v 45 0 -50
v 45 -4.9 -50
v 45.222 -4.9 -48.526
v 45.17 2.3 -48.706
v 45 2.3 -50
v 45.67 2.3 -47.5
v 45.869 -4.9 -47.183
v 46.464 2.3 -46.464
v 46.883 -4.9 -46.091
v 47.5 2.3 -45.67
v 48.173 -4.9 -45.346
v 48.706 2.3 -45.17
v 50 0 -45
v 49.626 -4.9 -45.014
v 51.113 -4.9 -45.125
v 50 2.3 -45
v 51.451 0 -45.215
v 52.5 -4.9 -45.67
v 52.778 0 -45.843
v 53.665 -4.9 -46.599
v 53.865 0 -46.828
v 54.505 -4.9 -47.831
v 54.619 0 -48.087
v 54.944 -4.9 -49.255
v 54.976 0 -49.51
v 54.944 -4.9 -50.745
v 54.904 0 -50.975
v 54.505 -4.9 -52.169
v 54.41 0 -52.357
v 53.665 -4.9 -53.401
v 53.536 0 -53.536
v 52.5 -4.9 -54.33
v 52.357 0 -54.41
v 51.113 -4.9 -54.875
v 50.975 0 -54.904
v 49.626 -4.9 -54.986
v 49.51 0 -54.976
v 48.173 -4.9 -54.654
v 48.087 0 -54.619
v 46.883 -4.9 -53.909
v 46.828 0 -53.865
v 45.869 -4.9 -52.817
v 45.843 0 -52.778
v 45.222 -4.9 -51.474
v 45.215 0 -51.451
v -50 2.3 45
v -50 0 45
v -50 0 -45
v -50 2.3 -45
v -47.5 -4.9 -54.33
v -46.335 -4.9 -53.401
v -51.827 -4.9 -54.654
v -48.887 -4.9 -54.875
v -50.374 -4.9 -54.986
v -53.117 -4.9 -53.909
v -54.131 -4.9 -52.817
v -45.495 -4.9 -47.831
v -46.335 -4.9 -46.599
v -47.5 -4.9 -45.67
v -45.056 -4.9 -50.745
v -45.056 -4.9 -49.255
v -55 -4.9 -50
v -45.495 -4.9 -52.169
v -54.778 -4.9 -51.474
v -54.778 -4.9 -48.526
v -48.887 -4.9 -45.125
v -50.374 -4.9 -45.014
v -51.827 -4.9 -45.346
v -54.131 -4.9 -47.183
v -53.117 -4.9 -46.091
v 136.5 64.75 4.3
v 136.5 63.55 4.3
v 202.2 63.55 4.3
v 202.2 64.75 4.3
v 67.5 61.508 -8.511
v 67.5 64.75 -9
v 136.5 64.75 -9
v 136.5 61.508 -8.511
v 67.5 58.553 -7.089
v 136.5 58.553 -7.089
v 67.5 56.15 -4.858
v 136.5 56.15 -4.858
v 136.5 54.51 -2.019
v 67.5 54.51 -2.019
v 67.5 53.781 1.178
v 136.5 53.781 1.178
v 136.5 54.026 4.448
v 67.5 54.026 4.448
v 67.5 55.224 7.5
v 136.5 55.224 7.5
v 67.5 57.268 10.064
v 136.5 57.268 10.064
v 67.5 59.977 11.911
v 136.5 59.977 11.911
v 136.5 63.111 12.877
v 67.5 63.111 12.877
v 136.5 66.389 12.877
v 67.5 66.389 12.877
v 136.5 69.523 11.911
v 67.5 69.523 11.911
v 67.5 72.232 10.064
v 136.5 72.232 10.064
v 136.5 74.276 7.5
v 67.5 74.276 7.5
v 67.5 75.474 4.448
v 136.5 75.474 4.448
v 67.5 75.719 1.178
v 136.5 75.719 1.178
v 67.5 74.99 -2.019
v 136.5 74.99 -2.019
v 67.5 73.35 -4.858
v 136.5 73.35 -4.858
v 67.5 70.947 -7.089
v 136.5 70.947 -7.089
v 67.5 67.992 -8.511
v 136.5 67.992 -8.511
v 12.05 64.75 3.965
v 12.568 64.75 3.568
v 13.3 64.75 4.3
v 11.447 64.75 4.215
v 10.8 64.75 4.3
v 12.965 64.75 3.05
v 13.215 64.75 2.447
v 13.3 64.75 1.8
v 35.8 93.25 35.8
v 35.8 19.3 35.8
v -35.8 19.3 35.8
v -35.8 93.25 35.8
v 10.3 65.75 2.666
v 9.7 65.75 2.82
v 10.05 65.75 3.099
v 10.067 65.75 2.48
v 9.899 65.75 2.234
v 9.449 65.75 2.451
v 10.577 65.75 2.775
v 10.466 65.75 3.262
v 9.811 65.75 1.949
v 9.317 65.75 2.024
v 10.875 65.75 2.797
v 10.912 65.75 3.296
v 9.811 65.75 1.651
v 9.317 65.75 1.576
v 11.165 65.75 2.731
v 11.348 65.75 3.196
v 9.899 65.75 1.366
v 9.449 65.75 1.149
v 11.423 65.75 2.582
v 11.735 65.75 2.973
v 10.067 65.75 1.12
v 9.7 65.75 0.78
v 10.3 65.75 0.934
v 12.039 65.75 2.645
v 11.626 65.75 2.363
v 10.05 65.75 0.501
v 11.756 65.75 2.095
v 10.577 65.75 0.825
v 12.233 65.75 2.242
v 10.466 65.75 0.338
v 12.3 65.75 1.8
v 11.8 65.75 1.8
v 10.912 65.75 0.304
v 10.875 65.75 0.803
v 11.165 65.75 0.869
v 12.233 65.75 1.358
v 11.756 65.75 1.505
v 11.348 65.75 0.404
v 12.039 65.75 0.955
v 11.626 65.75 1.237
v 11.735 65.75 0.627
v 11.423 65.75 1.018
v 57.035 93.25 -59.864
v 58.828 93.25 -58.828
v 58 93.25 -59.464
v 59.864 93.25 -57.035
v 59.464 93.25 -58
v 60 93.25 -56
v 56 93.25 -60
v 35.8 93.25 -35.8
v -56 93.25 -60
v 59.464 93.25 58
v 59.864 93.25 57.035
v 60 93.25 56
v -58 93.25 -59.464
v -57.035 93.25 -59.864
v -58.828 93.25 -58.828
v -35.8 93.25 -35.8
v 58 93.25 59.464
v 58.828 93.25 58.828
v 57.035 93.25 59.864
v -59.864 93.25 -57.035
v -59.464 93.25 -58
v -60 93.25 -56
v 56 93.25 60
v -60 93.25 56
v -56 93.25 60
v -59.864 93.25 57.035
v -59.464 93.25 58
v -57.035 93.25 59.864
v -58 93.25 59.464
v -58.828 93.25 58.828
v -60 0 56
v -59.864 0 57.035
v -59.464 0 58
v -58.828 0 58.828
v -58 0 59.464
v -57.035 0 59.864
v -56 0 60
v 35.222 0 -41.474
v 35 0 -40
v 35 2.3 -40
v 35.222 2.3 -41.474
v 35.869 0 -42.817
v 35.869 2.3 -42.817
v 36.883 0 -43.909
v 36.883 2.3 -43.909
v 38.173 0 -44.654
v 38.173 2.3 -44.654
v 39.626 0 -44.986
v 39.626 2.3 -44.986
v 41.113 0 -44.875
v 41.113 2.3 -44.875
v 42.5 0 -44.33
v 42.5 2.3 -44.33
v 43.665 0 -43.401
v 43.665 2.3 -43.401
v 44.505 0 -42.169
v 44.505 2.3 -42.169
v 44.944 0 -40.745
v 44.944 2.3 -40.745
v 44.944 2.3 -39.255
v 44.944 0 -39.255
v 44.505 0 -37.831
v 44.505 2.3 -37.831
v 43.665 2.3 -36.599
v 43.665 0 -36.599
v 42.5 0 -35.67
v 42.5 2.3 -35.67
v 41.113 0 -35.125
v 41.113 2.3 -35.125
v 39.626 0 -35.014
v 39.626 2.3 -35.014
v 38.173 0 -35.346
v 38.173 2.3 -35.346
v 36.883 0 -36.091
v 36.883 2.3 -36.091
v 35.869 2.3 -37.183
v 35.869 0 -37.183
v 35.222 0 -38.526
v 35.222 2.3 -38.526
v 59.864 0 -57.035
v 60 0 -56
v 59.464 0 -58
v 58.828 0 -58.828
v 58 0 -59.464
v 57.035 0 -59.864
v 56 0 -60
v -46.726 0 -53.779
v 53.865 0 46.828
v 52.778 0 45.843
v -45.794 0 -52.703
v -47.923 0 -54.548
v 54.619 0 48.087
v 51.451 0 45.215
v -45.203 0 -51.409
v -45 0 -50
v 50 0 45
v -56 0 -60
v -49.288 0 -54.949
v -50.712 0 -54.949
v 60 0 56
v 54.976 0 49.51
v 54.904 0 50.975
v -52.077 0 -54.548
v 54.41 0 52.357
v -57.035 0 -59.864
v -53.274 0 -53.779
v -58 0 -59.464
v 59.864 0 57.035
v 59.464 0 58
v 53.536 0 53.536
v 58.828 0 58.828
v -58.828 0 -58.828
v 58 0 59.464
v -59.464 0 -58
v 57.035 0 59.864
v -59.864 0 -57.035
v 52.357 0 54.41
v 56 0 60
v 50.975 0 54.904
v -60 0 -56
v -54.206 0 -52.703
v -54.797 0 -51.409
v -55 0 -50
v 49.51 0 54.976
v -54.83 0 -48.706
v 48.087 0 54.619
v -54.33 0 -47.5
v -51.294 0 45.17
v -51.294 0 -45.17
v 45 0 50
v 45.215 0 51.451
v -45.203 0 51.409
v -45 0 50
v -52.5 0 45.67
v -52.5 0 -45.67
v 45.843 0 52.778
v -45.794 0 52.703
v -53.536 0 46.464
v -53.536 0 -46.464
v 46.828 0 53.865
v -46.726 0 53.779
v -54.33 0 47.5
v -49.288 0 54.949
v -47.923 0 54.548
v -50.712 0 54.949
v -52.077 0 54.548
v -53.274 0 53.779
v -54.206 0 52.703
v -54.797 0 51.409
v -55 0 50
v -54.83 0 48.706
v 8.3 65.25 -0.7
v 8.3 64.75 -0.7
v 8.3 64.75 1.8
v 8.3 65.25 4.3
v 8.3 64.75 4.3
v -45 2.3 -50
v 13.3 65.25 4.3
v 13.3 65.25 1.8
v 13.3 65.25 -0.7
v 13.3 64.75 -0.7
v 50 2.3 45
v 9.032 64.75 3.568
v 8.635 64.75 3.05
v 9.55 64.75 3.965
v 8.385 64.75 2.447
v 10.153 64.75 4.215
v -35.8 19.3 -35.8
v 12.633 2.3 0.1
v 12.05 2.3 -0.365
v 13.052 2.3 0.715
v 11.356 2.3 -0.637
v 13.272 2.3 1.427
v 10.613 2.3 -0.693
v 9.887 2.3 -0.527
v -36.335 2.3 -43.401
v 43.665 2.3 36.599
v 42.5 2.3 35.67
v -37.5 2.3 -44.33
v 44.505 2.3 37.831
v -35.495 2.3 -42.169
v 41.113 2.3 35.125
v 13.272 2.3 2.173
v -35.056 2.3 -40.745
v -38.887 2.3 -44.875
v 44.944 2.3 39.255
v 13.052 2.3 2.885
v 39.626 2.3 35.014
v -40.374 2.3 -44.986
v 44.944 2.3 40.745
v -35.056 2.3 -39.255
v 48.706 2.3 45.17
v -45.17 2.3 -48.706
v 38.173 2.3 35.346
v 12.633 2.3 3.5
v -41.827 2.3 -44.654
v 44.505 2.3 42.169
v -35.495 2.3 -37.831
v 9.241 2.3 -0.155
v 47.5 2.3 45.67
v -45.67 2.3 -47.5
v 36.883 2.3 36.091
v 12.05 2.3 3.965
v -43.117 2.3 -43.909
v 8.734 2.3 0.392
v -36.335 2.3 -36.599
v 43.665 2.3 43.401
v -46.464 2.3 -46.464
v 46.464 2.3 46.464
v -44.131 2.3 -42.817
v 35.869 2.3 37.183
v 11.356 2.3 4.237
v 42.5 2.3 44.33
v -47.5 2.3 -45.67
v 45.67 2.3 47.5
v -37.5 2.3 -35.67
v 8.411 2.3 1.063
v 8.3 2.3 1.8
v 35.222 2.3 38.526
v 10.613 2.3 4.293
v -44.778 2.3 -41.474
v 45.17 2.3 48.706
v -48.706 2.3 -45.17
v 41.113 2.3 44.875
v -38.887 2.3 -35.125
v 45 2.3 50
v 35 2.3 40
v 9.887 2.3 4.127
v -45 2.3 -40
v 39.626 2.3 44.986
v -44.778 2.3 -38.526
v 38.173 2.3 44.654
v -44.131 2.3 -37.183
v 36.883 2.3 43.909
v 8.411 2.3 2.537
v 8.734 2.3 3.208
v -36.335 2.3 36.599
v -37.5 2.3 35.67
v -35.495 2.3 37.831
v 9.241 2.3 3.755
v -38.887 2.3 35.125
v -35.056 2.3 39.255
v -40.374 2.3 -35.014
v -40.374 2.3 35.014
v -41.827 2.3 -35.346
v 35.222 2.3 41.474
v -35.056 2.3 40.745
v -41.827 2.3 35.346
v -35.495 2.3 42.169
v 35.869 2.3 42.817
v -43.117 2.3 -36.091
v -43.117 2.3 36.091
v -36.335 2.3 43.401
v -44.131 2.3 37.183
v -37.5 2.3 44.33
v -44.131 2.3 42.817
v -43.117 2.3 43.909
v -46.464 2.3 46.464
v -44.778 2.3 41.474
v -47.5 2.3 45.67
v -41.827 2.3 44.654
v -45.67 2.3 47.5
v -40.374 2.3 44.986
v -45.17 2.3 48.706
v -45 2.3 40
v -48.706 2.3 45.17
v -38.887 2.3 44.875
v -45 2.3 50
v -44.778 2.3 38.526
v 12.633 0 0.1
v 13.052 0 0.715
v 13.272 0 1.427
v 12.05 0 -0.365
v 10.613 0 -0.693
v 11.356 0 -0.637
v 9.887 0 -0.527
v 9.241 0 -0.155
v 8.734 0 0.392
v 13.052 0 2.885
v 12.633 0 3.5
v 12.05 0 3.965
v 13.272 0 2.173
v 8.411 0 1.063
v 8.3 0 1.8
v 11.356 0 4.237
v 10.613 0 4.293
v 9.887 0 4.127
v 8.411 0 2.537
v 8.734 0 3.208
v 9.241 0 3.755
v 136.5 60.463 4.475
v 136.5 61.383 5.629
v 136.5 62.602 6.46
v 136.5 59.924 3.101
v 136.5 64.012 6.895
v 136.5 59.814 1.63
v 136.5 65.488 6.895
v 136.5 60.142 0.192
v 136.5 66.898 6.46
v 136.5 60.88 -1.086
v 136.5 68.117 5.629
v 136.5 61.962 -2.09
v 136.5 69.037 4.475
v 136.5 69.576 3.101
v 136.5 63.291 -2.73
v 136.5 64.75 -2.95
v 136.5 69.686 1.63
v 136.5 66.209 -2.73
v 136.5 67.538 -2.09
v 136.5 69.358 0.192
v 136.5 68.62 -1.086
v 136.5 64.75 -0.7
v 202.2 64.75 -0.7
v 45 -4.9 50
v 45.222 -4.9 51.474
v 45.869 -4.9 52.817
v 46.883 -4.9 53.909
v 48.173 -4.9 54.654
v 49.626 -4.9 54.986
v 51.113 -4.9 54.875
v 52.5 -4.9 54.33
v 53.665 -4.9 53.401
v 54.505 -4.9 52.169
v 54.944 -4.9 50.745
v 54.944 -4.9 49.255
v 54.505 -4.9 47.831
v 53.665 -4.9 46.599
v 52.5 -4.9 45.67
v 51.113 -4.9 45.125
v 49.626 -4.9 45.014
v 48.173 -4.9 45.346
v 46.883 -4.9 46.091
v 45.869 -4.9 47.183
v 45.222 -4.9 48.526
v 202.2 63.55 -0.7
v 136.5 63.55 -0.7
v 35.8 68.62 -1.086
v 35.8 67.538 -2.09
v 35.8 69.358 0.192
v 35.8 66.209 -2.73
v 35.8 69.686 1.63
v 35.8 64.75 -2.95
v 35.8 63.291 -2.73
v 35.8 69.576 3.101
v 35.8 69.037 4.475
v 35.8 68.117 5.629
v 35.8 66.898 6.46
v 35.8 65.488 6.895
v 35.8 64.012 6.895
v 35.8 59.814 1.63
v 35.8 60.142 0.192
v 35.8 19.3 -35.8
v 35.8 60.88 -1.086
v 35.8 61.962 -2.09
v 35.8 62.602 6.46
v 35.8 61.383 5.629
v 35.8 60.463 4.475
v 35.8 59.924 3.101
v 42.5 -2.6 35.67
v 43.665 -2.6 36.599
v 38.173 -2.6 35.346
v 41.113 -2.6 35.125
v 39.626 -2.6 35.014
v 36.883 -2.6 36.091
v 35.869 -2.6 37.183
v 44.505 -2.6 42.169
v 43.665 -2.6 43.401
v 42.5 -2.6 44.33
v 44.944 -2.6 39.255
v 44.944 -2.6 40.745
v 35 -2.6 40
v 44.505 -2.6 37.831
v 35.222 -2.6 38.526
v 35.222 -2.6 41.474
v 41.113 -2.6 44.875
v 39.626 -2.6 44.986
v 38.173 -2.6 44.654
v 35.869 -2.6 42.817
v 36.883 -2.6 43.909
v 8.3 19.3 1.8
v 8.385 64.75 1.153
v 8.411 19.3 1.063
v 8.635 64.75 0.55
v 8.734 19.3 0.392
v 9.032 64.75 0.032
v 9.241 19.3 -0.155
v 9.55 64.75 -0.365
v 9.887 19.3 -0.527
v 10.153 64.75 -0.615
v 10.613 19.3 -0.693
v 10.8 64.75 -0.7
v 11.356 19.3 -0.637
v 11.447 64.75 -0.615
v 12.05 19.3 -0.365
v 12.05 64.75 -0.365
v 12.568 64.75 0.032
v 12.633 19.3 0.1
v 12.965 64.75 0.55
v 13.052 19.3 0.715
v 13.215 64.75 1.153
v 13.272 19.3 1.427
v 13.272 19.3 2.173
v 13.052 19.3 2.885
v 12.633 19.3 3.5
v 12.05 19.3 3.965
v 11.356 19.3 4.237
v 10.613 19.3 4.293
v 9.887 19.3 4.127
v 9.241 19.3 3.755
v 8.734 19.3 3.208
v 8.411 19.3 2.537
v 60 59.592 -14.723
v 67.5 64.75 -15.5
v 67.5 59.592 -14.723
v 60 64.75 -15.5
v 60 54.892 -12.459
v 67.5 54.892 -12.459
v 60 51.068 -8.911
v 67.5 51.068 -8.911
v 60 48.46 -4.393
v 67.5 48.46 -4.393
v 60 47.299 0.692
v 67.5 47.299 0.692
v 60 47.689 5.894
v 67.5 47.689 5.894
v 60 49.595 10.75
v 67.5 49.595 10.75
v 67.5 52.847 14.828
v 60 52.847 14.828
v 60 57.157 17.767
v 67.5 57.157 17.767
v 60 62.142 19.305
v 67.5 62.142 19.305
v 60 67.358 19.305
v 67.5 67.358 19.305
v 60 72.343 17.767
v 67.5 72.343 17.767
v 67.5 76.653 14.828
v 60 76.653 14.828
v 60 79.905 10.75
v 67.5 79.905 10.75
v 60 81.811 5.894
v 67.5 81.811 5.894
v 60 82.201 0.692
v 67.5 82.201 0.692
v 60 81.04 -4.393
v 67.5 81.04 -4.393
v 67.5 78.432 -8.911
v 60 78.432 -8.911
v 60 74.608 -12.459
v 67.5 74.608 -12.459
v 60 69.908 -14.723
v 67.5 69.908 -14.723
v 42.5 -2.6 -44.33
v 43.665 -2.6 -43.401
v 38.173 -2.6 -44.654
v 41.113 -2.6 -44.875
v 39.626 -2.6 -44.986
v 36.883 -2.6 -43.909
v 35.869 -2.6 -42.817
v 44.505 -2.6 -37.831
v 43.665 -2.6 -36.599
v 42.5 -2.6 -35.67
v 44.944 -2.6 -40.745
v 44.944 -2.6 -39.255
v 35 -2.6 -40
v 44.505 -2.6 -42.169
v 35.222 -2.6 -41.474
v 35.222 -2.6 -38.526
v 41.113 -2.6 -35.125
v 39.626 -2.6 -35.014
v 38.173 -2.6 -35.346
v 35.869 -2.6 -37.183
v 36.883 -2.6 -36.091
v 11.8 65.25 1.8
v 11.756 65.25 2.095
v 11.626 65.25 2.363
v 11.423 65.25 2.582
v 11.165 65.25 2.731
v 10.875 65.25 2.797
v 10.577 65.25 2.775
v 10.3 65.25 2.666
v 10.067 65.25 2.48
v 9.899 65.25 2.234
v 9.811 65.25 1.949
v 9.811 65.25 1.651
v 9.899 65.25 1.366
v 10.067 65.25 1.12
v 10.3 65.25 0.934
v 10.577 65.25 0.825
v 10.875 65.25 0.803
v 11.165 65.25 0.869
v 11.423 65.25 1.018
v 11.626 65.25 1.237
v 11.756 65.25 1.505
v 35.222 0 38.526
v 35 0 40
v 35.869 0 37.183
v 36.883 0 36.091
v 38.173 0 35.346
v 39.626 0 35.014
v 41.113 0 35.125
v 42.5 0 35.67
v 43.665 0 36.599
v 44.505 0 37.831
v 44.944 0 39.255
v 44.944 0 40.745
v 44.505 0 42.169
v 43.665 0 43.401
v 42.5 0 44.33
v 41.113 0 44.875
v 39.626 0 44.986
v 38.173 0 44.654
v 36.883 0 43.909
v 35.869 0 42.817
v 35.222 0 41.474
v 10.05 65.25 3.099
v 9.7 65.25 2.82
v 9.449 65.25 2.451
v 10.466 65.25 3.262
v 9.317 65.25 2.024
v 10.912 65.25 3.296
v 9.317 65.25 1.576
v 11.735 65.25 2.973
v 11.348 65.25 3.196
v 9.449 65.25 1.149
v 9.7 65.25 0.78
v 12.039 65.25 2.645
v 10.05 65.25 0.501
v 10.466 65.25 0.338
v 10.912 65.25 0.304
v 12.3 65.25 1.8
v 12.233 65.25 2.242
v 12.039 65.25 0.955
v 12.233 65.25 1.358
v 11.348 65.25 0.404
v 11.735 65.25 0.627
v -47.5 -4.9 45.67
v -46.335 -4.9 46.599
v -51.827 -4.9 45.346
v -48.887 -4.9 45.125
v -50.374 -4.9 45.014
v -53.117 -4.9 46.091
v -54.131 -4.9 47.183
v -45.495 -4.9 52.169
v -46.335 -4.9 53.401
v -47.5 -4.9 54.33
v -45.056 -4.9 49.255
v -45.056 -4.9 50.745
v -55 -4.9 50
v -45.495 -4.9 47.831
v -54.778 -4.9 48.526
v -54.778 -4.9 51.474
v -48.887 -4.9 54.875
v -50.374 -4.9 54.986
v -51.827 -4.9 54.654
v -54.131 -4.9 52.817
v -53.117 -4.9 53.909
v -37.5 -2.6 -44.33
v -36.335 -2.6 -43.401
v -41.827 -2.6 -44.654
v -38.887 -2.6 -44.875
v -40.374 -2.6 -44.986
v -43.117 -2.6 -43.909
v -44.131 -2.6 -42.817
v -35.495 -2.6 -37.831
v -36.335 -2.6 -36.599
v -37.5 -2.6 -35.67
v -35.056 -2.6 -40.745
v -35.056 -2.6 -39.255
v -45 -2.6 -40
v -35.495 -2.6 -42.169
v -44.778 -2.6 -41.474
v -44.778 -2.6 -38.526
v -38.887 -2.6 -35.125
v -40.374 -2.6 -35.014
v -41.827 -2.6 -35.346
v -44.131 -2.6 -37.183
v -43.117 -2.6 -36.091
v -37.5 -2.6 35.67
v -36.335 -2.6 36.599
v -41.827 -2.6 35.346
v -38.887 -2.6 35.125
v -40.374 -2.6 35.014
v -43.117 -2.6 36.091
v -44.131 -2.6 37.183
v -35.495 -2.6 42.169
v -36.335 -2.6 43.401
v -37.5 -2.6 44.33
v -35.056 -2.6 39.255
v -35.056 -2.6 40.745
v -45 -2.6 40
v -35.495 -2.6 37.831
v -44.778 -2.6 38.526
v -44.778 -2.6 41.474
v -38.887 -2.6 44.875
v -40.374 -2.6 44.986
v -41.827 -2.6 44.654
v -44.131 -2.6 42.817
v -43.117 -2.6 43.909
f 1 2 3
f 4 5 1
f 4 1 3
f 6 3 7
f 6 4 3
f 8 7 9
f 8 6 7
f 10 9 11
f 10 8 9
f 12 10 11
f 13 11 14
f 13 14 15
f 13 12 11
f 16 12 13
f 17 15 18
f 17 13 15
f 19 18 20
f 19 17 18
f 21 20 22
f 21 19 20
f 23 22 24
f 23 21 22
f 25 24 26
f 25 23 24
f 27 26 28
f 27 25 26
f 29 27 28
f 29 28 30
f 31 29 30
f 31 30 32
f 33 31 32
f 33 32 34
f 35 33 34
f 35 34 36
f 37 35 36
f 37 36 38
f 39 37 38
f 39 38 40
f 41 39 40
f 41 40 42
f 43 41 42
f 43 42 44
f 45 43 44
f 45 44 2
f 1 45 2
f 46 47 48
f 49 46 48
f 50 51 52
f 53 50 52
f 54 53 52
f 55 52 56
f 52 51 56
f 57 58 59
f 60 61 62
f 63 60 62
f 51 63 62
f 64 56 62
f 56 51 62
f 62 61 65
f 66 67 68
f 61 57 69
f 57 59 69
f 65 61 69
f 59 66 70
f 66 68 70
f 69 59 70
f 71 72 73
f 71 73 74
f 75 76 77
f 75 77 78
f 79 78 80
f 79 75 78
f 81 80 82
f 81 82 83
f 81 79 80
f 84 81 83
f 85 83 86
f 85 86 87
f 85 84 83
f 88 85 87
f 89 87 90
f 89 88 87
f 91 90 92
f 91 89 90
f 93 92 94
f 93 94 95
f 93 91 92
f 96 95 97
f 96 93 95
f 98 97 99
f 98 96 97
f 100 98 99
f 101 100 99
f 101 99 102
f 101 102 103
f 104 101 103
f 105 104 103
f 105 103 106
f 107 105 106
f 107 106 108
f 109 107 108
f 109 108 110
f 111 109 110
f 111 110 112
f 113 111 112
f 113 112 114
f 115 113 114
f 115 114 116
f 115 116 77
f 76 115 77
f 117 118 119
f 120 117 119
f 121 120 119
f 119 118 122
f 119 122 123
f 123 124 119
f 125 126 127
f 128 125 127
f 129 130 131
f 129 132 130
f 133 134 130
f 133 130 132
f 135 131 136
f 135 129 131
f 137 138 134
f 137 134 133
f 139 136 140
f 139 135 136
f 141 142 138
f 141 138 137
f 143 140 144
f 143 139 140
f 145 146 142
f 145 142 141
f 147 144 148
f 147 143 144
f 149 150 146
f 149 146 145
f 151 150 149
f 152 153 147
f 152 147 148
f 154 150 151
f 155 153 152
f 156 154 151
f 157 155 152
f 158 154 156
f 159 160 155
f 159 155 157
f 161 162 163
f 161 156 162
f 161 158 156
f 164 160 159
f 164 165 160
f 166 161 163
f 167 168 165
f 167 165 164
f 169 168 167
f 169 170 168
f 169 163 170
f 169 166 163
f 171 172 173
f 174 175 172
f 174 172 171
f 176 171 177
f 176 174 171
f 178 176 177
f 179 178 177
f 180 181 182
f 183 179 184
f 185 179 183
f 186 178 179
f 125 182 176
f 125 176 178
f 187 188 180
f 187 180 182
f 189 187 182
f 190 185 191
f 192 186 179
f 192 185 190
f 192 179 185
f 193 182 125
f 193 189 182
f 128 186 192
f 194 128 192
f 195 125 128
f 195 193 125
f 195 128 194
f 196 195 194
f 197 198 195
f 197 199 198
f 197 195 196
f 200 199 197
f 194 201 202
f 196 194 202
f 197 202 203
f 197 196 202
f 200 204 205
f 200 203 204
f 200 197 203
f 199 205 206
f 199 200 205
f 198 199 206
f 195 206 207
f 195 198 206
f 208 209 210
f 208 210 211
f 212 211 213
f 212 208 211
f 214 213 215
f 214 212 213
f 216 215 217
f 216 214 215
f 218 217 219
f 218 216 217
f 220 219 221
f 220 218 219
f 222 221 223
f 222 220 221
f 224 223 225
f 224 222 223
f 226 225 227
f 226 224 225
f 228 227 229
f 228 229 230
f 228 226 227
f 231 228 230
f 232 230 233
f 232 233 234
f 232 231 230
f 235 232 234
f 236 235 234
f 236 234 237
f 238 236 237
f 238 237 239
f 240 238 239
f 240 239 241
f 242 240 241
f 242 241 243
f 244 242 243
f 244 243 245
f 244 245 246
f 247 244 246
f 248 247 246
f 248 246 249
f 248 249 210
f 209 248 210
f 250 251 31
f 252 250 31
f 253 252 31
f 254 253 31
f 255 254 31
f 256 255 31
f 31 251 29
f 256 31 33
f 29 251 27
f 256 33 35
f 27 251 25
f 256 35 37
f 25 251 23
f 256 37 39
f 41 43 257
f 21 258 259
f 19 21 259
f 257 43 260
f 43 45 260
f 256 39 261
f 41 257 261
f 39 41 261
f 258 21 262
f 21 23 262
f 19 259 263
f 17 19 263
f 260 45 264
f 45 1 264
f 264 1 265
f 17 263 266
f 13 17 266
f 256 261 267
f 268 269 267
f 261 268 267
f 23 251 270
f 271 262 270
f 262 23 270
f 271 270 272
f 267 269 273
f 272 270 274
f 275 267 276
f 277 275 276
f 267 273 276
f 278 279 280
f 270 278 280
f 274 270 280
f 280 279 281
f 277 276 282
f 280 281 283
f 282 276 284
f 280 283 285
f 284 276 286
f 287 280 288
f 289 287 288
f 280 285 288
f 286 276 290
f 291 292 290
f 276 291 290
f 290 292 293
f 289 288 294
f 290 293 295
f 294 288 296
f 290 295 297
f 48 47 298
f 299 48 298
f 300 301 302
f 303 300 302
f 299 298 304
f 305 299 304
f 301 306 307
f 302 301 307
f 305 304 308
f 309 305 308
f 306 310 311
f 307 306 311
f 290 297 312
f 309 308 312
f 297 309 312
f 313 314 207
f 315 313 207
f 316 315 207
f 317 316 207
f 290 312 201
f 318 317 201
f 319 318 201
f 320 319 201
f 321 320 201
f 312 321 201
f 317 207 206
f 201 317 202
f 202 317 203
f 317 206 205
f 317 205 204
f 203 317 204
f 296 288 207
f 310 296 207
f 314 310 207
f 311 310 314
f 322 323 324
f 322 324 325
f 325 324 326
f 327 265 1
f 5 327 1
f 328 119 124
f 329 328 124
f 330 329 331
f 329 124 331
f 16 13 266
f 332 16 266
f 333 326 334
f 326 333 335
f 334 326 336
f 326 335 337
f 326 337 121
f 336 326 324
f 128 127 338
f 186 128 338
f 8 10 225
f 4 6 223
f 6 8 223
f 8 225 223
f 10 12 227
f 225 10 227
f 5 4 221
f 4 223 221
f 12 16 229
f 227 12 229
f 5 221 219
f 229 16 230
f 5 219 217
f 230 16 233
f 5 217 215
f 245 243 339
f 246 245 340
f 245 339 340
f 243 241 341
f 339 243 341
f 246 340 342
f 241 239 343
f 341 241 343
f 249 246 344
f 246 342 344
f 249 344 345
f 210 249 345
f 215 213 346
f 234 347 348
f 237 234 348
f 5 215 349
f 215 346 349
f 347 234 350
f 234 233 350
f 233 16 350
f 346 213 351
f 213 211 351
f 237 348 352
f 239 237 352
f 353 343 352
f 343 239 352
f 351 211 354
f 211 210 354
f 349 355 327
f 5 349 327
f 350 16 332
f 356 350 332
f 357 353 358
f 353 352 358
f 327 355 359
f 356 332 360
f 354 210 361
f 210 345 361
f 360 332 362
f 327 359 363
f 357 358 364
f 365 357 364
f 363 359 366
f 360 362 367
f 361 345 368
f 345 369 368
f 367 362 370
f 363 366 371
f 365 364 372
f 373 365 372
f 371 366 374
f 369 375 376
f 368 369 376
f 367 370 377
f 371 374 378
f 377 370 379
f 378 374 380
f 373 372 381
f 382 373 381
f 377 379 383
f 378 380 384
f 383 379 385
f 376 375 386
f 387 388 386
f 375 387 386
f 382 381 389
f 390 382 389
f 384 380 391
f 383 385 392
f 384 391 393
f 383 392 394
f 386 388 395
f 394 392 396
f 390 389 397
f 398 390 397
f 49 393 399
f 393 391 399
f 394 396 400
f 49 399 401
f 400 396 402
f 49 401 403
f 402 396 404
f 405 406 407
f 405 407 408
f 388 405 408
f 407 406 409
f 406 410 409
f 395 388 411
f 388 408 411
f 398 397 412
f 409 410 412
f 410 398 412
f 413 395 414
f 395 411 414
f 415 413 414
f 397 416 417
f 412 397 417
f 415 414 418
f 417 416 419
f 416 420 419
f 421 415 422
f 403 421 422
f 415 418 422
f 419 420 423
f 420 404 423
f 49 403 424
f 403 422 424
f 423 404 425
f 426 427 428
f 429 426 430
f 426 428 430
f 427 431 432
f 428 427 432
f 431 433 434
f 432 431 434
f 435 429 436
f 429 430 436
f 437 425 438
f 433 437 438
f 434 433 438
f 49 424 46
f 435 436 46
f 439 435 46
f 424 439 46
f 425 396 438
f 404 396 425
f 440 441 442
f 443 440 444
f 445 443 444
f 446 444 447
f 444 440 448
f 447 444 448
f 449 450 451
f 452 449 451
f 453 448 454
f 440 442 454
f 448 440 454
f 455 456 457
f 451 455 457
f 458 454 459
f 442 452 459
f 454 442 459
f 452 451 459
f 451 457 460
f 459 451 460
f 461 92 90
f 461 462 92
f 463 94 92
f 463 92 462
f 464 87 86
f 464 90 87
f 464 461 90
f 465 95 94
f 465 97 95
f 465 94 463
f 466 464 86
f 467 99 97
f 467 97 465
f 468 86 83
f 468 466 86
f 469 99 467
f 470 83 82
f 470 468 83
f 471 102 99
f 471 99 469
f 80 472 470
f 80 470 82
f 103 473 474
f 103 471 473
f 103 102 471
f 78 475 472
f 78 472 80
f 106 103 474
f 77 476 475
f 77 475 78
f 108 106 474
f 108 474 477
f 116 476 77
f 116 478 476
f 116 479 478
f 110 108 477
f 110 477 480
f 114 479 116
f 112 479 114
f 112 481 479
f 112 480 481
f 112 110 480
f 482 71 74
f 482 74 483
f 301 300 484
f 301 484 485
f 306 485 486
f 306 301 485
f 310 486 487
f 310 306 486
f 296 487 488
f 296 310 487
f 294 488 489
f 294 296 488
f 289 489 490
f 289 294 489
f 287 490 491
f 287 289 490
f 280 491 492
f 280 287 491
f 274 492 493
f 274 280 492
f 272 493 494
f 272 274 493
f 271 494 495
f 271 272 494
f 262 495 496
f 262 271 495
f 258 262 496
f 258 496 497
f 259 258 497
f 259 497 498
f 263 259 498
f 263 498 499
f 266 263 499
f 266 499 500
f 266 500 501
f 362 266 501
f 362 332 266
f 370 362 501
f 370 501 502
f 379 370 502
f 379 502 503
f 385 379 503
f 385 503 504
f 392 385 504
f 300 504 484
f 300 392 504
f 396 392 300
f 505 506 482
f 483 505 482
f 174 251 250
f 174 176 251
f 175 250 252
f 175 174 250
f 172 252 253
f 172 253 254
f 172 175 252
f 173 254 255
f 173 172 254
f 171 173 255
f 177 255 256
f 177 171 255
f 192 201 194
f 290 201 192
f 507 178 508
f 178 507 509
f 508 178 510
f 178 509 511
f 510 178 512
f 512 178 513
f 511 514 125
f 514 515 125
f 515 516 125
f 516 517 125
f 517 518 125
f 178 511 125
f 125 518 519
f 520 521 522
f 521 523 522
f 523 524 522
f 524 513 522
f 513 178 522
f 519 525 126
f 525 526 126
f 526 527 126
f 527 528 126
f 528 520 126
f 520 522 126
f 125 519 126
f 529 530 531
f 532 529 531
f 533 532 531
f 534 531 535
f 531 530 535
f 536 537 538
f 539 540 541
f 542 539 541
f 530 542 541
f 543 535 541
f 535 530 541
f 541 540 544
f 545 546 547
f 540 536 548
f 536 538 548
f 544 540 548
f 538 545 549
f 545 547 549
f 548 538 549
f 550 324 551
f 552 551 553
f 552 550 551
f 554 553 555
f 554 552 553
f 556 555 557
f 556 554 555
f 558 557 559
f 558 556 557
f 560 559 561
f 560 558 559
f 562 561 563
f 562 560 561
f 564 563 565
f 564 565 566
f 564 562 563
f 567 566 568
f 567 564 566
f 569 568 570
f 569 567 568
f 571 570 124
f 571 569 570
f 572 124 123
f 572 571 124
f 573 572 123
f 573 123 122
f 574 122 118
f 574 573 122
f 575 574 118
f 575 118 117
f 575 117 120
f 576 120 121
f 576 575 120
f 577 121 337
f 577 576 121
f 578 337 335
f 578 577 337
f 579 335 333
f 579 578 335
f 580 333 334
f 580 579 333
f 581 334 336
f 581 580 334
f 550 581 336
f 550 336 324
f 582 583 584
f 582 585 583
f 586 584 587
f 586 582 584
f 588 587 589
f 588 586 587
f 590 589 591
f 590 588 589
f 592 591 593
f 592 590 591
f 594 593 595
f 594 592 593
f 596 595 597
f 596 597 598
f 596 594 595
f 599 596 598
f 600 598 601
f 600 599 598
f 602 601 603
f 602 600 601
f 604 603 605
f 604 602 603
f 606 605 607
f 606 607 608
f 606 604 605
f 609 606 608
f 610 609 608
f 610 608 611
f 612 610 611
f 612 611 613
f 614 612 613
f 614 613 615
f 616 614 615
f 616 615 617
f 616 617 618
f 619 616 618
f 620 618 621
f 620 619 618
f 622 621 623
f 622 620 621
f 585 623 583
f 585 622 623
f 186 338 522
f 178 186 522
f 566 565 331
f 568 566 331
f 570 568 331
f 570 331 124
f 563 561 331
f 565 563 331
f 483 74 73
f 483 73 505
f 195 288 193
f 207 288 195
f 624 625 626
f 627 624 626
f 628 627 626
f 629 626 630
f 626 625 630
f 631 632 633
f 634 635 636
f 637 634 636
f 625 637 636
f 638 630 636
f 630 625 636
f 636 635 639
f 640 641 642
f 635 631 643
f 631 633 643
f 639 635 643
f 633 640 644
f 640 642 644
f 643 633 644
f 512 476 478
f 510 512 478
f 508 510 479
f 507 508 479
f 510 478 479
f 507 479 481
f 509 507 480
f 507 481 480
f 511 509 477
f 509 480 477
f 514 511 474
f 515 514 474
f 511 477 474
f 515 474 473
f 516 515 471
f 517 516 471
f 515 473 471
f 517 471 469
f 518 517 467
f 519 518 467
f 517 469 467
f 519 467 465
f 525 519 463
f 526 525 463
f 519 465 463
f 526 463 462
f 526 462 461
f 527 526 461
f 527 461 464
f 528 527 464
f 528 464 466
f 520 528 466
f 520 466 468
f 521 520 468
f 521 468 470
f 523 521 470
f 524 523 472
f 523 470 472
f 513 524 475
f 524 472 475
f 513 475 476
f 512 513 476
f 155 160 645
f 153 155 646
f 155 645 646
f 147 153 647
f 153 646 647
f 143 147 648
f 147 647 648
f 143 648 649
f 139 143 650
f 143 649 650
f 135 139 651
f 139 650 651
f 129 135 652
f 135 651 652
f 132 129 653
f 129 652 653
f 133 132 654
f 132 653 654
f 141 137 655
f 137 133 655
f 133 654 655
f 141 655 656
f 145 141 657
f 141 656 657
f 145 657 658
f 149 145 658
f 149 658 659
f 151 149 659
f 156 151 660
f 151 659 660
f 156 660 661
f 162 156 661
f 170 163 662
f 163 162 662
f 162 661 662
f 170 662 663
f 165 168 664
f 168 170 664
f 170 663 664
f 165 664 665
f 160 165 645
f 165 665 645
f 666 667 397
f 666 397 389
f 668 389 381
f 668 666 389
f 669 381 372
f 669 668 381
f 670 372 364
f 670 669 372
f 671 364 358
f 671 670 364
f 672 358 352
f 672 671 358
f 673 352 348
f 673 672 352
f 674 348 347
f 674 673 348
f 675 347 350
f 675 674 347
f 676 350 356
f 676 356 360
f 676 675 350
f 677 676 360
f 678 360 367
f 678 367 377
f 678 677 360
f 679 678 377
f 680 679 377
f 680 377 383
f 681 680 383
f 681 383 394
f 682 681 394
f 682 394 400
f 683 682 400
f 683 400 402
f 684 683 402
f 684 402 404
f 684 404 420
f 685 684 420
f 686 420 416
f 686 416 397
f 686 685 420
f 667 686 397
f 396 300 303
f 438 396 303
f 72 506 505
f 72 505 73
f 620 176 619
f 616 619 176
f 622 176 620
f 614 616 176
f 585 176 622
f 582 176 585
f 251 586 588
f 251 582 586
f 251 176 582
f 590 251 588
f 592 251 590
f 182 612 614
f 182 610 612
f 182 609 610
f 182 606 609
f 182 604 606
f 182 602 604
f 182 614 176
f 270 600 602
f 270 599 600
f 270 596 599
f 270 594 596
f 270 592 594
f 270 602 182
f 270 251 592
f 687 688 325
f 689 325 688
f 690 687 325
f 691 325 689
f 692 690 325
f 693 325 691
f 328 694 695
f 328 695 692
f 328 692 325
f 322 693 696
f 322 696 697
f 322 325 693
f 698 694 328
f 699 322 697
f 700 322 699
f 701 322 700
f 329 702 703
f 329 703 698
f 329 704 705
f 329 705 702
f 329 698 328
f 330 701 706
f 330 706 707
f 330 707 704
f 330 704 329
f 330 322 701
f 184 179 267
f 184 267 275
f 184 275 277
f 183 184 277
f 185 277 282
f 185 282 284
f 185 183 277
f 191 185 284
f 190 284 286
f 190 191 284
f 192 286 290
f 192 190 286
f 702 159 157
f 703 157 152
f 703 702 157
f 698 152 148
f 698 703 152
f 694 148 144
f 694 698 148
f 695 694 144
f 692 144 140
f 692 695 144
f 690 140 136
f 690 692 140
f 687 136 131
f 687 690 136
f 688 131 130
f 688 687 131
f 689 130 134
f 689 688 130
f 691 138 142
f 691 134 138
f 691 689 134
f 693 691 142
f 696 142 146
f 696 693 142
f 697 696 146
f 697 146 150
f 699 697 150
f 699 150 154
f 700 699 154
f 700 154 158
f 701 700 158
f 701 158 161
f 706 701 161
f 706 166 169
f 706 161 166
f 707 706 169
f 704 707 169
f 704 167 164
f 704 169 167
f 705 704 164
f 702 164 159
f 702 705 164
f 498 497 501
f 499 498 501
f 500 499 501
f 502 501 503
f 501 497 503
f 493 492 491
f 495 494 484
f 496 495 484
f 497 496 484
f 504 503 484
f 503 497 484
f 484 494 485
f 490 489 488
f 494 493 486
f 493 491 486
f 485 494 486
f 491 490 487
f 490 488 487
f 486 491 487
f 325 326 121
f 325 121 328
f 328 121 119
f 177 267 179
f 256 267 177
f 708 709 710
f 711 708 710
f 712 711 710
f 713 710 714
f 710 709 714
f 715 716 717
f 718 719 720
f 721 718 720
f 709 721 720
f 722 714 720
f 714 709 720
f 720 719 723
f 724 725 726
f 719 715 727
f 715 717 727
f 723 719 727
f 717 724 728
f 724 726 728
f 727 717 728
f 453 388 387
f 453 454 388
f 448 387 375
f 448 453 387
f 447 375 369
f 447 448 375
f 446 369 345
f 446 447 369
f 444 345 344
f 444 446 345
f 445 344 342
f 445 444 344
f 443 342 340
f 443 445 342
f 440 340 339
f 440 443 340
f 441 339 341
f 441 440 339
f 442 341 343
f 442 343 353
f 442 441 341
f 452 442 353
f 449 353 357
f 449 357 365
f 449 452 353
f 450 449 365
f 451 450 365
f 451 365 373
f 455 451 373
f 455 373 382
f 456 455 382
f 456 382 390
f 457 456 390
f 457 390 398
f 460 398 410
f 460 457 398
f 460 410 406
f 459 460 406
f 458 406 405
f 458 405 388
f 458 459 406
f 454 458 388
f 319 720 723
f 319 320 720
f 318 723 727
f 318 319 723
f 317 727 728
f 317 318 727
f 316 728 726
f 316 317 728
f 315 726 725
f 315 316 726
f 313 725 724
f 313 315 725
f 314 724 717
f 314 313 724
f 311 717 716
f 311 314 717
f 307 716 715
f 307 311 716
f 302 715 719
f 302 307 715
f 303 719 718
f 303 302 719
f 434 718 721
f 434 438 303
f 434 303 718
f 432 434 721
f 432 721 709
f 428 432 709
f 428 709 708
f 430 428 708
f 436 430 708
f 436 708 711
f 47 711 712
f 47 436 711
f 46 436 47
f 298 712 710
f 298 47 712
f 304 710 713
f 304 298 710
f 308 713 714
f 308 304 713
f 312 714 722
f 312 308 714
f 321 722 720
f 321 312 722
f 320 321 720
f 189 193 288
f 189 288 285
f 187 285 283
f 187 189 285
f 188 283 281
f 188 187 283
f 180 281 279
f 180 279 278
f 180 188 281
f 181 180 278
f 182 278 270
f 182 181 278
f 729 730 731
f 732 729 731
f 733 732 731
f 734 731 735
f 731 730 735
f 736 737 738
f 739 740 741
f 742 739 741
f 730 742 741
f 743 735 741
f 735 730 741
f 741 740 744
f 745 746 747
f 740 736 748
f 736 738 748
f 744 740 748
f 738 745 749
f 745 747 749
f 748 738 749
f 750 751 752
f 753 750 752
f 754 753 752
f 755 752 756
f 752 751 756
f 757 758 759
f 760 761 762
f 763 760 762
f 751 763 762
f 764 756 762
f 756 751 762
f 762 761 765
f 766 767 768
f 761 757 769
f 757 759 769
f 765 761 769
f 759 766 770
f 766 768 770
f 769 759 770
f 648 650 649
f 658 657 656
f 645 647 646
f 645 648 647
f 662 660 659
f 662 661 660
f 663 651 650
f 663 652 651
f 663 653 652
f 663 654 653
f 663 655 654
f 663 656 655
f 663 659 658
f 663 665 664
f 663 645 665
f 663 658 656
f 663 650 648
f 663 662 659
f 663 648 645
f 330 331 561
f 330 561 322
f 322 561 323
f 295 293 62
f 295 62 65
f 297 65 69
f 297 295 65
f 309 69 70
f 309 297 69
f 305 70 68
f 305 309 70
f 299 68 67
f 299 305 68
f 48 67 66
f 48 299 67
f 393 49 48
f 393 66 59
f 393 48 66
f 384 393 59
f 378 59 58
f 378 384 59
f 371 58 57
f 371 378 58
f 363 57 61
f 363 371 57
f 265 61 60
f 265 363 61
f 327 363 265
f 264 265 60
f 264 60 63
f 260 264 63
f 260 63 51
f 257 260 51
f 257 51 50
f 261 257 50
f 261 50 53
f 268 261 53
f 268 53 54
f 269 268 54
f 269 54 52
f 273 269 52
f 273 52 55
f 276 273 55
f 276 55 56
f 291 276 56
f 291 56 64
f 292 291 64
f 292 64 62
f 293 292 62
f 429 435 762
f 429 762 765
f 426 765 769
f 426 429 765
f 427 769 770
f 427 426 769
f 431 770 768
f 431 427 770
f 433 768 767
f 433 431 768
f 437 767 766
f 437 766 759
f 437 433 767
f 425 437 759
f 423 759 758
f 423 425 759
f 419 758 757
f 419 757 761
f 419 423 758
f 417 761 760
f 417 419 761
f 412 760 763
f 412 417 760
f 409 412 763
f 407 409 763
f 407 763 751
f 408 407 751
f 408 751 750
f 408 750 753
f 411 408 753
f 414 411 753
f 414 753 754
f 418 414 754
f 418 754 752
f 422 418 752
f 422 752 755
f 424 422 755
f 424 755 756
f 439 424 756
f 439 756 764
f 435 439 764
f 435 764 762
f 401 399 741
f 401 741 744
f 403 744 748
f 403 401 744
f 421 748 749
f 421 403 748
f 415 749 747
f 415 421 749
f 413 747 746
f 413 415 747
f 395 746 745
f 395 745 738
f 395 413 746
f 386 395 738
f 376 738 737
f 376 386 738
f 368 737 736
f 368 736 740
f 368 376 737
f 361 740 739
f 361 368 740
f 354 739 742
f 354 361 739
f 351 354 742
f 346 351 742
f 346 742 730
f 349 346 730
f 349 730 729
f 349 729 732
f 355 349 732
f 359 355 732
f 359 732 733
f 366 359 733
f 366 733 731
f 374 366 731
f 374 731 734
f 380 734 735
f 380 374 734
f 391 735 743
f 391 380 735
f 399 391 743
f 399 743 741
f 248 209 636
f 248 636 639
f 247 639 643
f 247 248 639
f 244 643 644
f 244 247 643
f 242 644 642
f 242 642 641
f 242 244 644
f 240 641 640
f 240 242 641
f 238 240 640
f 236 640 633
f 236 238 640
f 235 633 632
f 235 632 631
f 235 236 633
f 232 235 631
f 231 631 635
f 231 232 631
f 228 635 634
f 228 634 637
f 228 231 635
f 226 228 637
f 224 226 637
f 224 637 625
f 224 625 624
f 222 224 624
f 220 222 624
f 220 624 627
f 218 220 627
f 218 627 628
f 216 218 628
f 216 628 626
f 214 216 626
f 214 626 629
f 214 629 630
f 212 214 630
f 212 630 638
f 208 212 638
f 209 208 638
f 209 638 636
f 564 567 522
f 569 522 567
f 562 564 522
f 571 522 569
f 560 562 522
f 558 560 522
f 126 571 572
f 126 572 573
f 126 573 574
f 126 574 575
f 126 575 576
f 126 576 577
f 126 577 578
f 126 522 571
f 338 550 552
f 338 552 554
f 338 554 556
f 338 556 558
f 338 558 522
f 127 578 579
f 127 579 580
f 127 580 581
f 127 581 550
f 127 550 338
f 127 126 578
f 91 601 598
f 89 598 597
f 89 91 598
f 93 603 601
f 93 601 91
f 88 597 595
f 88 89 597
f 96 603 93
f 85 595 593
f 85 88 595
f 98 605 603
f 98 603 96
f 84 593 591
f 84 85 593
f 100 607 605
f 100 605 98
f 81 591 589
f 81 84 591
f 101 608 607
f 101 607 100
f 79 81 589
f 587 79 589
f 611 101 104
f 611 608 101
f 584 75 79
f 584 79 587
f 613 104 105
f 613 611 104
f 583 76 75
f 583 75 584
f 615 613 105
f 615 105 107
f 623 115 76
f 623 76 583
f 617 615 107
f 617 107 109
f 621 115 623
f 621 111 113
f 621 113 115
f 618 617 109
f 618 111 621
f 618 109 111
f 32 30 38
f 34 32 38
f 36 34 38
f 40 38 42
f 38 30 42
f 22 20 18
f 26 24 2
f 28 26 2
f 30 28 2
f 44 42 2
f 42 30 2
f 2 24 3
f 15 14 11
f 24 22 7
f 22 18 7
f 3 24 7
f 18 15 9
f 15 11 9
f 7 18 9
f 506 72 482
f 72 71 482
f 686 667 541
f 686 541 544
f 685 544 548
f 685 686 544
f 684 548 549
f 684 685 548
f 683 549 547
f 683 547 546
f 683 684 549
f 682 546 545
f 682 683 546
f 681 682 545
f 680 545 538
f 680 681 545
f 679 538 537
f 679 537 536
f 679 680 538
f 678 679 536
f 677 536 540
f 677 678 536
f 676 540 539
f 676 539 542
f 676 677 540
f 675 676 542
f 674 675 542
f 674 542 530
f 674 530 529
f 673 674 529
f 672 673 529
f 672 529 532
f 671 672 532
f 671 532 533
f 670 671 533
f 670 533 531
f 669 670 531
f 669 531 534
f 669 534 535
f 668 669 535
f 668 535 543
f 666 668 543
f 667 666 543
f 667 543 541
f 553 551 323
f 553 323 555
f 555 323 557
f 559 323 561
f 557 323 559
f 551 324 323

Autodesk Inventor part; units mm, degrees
ref_plane "YZ Plane" through (0, 0, 0) normal (1, 0, 0) x (0, 1, 0)
ref_plane "XZ Plane" through (0, 0, 0) normal (0, 1, 0) x (-1, 0, 0)
ref_plane "XY Plane" through (0, 0, 0) normal (0, 0, 1) x (1, 0, 0)
sketch "Sketch1" plane through (0, 0, 0) normal (0, 1, 0) x (-1, 0, 0)
  line L0 (0, 0) -> (60, 0)
  line L1 (60, 0) -> (60, -60)
  line L2 (60, -60) -> (-60, -60)
  line L3 (-60, -60) -> (-60, 60)
  line L4 (-60, 60) -> (60, 60)
  line L5 (60, 60) -> (60, -60)
  line L6 (-60, 0) -> (-35.8, 0)
  line L7 (-35.8, 60) -> (-35.8, 35.8)
  line L8 (60, 0) -> (35.8, 0)
  line L9 (35.8, -60) -> (35.8, -35.8)
  line L10 (-35.8, 35.8) -> (35.8, 35.8)
  line L11 (35.8, 35.8) -> (35.8, -35.8)
  line L12 (35.8, -35.8) -> (-35.8, -35.8)
  line L13 (-35.8, -35.8) -> (-35.8, 35.8)
  line L14 (-60, 60) -> (-50, 60)
  line L15 (-50, 60) -> (-50, 50)
  line L16 (-50, 50) -> (-60, 50)
  line L17 (-60, 50) -> (-60, 60)
  line L18 (60, 60) -> (50, 60)
  line L19 (50, 60) -> (50, 50)
  line L20 (50, 50) -> (60, 50)
  line L21 (60, 50) -> (60, 60)
  line L22 (60, -60) -> (50, -60)
  line L23 (50, -60) -> (50, -50)
  line L24 (50, -50) -> (60, -50)
  line L25 (60, -50) -> (60, -60)
  line L26 (-60, -60) -> (-50, -60)
  line L27 (-50, -60) -> (-50, -50)
  line L28 (-50, -50) -> (-60, -50)
  line L29 (-60, -50) -> (-60, -60)
  line L30 (-50, 50) -> (50, 50)
  line L31 (50, 50) -> (50, -50)
  line L32 (50, -50) -> (-50, -50)
  line L33 (-50, -50) -> (-50, 50)
  circle A0 centre (-50, 50) radius 5
  circle A1 centre (-50, -50) radius 5
  circle A2 centre (50, -50) radius 5
  circle A3 centre (50, 50) radius 5
  line L34 (-35.8, 35.8) -> (-10.8, 35.8)
  line L35 (-10.8, 35.8) -> (-10.8, 1.8)
  line L36 (-10.8, 1.8) -> (-35.8, 1.8)
  line L37 (-35.8, 1.8) -> (-35.8, 35.8)
  circle A4 centre (-10.8, 1.8) radius 2.5
  line L38 (-50, -50) -> (-40, -50)
  line L39 (-40, -50) -> (-40, -40)
  line L40 (-40, -40) -> (-50, -40)
  line L41 (-50, -40) -> (-50, -50)
  line L42 (-40, -40) -> (40, -40)
  line L43 (40, -40) -> (40, 40)
  line L44 (40, 40) -> (-40, 40)
  line L45 (-40, 40) -> (-40, -40)
  circle A5 centre (-40, -40) radius 5
  circle A6 centre (40, -40) radius 5
  circle A7 centre (40, 40) radius 5
  circle A8 centre (-40, 40) radius 5
  point P0 (45, -50)
  point P1 (50, -45)
  point P2 (50, 45)
  point P3 (45, 50)
  point P4 (-45, 50)
  point P5 (-50, 45)
  point P6 (-50, -45)
  point P7 (-45, -50)
  dimension "d0" = 60
  dimension "d1" = 60
  dimension "d2" = 120
  dimension "d3" = 120
  dimension "d5" = 24.2
  dimension "d7" = 24.2
  dimension "d23" = 24.2
  dimension "d24" = 24.2
  dimension "d26" = 10
  dimension "d27" = 10
  dimension "d28" = 10
  dimension "d29" = 10
  dimension "d30" = 10
  dimension "d31" = 10
  dimension "d32" = 10
  dimension "d33" = 10
  dimension "d34" = 10
  dimension "d35" = 10
  dimension "d36" = 10
  dimension "d37" = 10
  dimension "d42" = 25
  dimension "d43" = 34
  dimension "d44" = 5
  dimension "d53" = 10
  dimension "d54" = 10
  dimension "d55" = 80
  dimension "d56" = 80
  dimension "d57" = 10
  dimension "d58" = 10
  dimension "d59" = 10
  dimension "d60" = 10
extrude "Extrusion1" add sketch "Sketch1" along normal blind 93.25 contours L11 L10 L7 A8 L44 A7 L43 L0 | L0 L43 A6 L9 L11 | L43 A7 L44 A8 L7 L30 A3 L31 L0 | L0 L31 A2 L32 L9 A6 L43 | L9 A6 L42 A5 L45 L6 L13 L12 | L31 A3 L20 L5 L0 | L0 L1 L24 A2 L31 | A6 L9 L42 L43 | L43 L42 L9 A6 | A7 L44 L43 | L43 L44 A7 | L9 L42 A6 | A3 L30 L31 | L31 L20 A3 | A2 L24 L31 | L31 L32 A2 | L13 L6 L45 A8 L7 | L9 A6 L42 | A6 L9 L32 L39 A5 L42 | L1 L2 L23 A2 L24 | L20 A3 L19 L4 L5 | L30 A3 L19 | L19 A3 L20 | L30 L7 L4 L19 A3 | L24 A2 L23 | L23 A2 L32 | A2 L23 L2 L9 L32 | A8 L7 L44 | L44 L7 A8 | A8 L45 L44 L7 | A5 L39 L42 | L42 L45 A5 | L45 A5 L40 L33 L6 | L6 L33 A0 L30 L7 A8 L45 | L30 A0 L15 L4 L7 | L9 L2 L27 A1 L32 | L44 L45 A8 L7 | L39 A5 L40 | L40 A5 L45 | L39 L32 A1 L33 L40 A5 | L33 A1 L28 L3 L6 | L6 L3 L16 A0 L33 | A0 L33 L30 | L30 L15 A0 | A0 L16 L33 | L15 A0 L16 L3 L4 | L16 A0 L15 | L2 L3 L28 A1 L27 | A1 L27 L32 | L32 L33 A1 | L33 L28 A1 | A1 L28 L27
extrude "Extrusion2" add sketch "Sketch1" along normal blind 19.3 contours L11 L12 L13 L36 A4 L35 L10 | L35 A4 L36 L13 L10 | A4 L36 L35 | L35 L36 A4
sketch "Sketch2" plane through (60, 0, 60) normal (1, 0, 0) x (0, 0, -1)
  line L0 (0, 93.25) -> (120, 93.25)
  line L1 (0, 93.25) -> (58, 93.25)
  line L2 (91.8, 93.25) -> (24.2, 93.25)
  line L3 (58, 93.25) -> (58, 0)
  line L4 (0, 0) -> (120, 0) projected
  line L5 (58, 93.25) -> (58, 64.75)
  circle A0 centre (58, 64.75) radius 17.5
  circle A1 centre (58, 64.75) radius 11
  circle A2 centre (58, 64.75) radius 4.95
  line L6 (24.2, 19.3) -> (24.2, 93.25) projected
  dimension "d12" = 28.5
  dimension "d13" = 35
  dimension "d14" = 22
  dimension "d19" = 9.9
  dimension "d48" = 33.8
extrude "Extrusion3" add sketch "Sketch2" along normal blind 7.5 contours A0 L3 A1 | L3 A1 A0
extrude "Extrusion4" add sketch "Sketch2" along normal blind 76.5 contours A1 L3 A2 | L3 A2 A1 | A2 L3 | L3 A2
extrude "Extrusion5" cut sketch "Sketch2" along normal mid plane 160 contours A2 L3 | L3 A2
fillet "Fillet1" radius 4 4 edges at (-60, 46.625, 60) (-60, 46.625, -60) (60, 46.625, 60) (60, 46.625, -60)
extrude "Extrusion6" cut sketch "Sketch1" along normal blind 2.3 contours L11 L10 L7 A8 L44 A7 L43 L0 | L11 L12 L13 L36 A4 L35 L10 | L0 L43 A6 L9 L11 | L43 A7 L44 A8 L7 L30 A3 L31 L0 | L0 L31 A2 L32 L9 A6 L43 | L9 A6 L42 A5 L45 L6 L13 L12 | A6 L9 L42 L43 | L43 L42 L9 A6 | A7 L44 L43 | L43 L44 A7 | L35 A4 L36 L13 L10 | L9 L42 A6 | L13 L6 L45 A8 L7 | A4 L36 L35 | L35 L36 A4 | L9 A6 L42 | A6 L9 L32 L39 A5 L42 | A8 L7 L44 | L44 L7 A8 | A8 L45 L44 L7 | A5 L39 L42 | L42 L45 A5 | L45 A5 L40 L33 L6 | L6 L33 A0 L30 L7 A8 L45 | L44 L45 A8 L7 | L39 A5 L40 | L40 A5 L45 | L39 L32 A1 L33 L40 A5
extrude "Extrusion7" add sketch "Sketch1" against normal blind 4.9 contours A3 L30 L31 | L31 L20 A3 | A2 L24 L31 | L31 L32 A2 | L30 A3 L19 | L19 A3 L20 | L24 A2 L23 | L23 A2 L32 | A0 L33 L30 | L30 L15 A0 | A0 L16 L33 | L16 A0 L15 | A1 L27 L32 | L32 L33 A1 | L33 L28 A1 | A1 L28 L27
extrude "Extrusion8" add sketch "Sketch1" along normal blind 64.75 contours A4 L36 L35 | L35 L36 A4
sketch "Sketch3" plane through (136.5, 64.75, 2) normal (1, 0, 0) x (0, 0, -1)
  line L0 (2.7, -45.45) -> (2.7, 0) projected
  line L1 (-2.3, 0) -> (2.7, 0)
  line L2 (2.7, 0) -> (2.7, -1.2)
  line L3 (2.7, -1.2) -> (-2.3, -1.2)
  line L4 (-2.3, -1.2) -> (-2.3, 0)
  point P0 (2, -64.75)
  dimension "d50" = 1.2
extrude "Extrusion9" add sketch "Sketch3" along normal blind 65.7
extrude "Extrusion10" add sketch "Sketch1" along normal blind 2.3 and the other way blind 2.6 contours A6 L9 L42 L43 | L43 L42 L9 A6 | A7 L44 L43 | L43 L44 A7 | L9 L42 A6 | L9 A6 L42 | A8 L7 L44 | L44 L7 A8 | A8 L45 L44 L7 | A5 L39 L42 | L42 L45 A5 | L44 L45 A8 L7 | L39 A5 L40 | L40 A5 L45
sketch "Sketch4" plane through (10.8, 64.75, 1.8) normal (0, 1, 0) x (1, 0, 0)
  circle A0 centre (0, 0) radius 1
  circle A1 centre (0, 0) radius 1.5
  line L0 (0, 0) -> (2.5, 0)
  circle A2 centre (0, 0) radius 2.5 projected
  line L1 (2.5, 0) -> (2.5, 2.5)
  line L2 (2.5, 2.5) -> (-2.5, 2.5)
  line L3 (-2.5, 2.5) -> (-2.5, -2.5)
  line L4 (-2.5, -2.5) -> (2.5, -2.5)
  line L5 (2.5, -2.5) -> (2.5, 2.5)
  point P0 (-10.8, 1.8)
  point P1 (2.5, 0)
  dimension "d65" = 2
  dimension "d66" = 3
  dimension "d67" = 2.5
  dimension "d68" = 5
  dimension "d69" = 5
extrude "Extrusion11" add sketch "Sketch4" along normal blind 1 contours A1
extrude "Extrusion12" add sketch "Sketch4" along normal blind 0.5 contours A0 | A1 | A2 | A2 L2 L1 | L5 L4 A2 | A2 L3 L2 | L4 L3 A2
properties part number "sample-transferbox"
